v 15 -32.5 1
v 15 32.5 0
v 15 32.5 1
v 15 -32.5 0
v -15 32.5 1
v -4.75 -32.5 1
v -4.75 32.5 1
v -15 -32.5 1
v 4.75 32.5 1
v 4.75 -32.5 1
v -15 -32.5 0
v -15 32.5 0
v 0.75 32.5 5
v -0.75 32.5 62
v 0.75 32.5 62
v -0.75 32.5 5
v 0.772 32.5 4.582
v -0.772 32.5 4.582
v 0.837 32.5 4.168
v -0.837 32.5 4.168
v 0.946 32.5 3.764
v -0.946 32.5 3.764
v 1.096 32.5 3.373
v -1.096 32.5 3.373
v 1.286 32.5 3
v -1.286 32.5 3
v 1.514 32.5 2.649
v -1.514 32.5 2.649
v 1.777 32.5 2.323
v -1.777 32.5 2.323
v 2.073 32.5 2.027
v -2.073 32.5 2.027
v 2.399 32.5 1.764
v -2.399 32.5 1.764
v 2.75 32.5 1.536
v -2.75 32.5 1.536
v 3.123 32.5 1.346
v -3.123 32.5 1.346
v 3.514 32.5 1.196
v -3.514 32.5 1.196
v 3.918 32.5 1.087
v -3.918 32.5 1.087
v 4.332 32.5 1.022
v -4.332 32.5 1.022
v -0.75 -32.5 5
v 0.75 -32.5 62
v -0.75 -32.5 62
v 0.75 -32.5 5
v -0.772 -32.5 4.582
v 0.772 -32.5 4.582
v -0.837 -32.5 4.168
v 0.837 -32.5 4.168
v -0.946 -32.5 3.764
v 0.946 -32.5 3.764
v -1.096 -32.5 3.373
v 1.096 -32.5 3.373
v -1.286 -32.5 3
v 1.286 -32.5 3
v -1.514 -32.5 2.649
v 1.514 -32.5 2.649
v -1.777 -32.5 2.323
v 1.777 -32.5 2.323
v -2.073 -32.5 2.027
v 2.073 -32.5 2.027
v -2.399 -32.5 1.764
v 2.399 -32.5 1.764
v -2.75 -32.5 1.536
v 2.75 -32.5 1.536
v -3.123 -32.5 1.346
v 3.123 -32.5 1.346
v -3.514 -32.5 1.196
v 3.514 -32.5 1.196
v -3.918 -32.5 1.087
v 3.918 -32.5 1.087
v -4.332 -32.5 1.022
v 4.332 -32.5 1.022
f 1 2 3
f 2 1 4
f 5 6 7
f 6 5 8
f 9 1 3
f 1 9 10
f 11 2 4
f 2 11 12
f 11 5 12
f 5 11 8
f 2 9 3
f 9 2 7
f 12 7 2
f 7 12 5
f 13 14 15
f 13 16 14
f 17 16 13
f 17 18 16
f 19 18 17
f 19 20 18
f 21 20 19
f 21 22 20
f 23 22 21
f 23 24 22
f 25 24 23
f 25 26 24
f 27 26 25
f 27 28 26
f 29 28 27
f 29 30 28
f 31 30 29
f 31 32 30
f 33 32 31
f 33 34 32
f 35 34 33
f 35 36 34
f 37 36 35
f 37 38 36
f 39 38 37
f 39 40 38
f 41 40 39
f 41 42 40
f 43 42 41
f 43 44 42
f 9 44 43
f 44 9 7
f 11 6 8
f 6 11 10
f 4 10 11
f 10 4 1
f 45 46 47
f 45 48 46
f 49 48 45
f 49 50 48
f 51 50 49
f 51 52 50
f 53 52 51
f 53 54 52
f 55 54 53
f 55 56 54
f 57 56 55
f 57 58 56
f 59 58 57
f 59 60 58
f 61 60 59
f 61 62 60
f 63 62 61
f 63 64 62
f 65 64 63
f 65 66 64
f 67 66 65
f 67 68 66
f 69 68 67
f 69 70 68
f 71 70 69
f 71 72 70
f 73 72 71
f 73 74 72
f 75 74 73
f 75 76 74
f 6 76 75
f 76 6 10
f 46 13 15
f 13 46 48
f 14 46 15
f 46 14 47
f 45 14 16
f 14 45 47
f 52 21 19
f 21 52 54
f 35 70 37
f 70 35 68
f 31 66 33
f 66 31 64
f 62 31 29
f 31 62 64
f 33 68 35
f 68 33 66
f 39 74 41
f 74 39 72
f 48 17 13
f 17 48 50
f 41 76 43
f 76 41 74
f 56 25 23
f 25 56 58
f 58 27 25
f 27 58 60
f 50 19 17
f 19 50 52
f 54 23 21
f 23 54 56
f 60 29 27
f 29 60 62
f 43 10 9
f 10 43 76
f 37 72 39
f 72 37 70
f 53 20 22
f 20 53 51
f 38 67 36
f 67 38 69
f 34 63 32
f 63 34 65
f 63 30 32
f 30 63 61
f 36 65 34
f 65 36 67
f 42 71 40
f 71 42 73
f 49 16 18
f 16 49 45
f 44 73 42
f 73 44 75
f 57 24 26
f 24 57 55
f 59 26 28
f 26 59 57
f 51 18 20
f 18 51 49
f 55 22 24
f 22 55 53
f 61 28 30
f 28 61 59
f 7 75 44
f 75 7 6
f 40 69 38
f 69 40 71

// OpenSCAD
$fn = 60;
wall = 1.5;
theFloor = 1;
floorLength = 30;
height = 62;
width = 65;
middle = true;
rounded = 8;

//T_shape();
//rounded();
roundedEdges();

module roundedEdges() {
    T_shape();
    for(i = [0, 1])
        mirror([i, 0, 0])
            translate([wall / 2, 0, theFloor])
                rounded();
}


module T_shape() {
    translate([0, 0, theFloor / 2])
        cube([floorLength, width, theFloor], center = true);
    translate([0, 0, height / 2])
    cube([wall, width, height], center = true);
}

module rounded() {
    cube = [rounded, rounded, width];
    rotate([90, 0, 0])
        translate([cube.x, cube.y, 0] / 2)
        difference() {
            cube(cube, center = true);
            cylinder(d = rounded, h = width * 2, center = true);
            translate([0, -cube.y, -cube.z])
                cube(cube * 2); 
            translate([-cube.x, 0, -cube.z])
                cube(cube * 2); 
        }
}
